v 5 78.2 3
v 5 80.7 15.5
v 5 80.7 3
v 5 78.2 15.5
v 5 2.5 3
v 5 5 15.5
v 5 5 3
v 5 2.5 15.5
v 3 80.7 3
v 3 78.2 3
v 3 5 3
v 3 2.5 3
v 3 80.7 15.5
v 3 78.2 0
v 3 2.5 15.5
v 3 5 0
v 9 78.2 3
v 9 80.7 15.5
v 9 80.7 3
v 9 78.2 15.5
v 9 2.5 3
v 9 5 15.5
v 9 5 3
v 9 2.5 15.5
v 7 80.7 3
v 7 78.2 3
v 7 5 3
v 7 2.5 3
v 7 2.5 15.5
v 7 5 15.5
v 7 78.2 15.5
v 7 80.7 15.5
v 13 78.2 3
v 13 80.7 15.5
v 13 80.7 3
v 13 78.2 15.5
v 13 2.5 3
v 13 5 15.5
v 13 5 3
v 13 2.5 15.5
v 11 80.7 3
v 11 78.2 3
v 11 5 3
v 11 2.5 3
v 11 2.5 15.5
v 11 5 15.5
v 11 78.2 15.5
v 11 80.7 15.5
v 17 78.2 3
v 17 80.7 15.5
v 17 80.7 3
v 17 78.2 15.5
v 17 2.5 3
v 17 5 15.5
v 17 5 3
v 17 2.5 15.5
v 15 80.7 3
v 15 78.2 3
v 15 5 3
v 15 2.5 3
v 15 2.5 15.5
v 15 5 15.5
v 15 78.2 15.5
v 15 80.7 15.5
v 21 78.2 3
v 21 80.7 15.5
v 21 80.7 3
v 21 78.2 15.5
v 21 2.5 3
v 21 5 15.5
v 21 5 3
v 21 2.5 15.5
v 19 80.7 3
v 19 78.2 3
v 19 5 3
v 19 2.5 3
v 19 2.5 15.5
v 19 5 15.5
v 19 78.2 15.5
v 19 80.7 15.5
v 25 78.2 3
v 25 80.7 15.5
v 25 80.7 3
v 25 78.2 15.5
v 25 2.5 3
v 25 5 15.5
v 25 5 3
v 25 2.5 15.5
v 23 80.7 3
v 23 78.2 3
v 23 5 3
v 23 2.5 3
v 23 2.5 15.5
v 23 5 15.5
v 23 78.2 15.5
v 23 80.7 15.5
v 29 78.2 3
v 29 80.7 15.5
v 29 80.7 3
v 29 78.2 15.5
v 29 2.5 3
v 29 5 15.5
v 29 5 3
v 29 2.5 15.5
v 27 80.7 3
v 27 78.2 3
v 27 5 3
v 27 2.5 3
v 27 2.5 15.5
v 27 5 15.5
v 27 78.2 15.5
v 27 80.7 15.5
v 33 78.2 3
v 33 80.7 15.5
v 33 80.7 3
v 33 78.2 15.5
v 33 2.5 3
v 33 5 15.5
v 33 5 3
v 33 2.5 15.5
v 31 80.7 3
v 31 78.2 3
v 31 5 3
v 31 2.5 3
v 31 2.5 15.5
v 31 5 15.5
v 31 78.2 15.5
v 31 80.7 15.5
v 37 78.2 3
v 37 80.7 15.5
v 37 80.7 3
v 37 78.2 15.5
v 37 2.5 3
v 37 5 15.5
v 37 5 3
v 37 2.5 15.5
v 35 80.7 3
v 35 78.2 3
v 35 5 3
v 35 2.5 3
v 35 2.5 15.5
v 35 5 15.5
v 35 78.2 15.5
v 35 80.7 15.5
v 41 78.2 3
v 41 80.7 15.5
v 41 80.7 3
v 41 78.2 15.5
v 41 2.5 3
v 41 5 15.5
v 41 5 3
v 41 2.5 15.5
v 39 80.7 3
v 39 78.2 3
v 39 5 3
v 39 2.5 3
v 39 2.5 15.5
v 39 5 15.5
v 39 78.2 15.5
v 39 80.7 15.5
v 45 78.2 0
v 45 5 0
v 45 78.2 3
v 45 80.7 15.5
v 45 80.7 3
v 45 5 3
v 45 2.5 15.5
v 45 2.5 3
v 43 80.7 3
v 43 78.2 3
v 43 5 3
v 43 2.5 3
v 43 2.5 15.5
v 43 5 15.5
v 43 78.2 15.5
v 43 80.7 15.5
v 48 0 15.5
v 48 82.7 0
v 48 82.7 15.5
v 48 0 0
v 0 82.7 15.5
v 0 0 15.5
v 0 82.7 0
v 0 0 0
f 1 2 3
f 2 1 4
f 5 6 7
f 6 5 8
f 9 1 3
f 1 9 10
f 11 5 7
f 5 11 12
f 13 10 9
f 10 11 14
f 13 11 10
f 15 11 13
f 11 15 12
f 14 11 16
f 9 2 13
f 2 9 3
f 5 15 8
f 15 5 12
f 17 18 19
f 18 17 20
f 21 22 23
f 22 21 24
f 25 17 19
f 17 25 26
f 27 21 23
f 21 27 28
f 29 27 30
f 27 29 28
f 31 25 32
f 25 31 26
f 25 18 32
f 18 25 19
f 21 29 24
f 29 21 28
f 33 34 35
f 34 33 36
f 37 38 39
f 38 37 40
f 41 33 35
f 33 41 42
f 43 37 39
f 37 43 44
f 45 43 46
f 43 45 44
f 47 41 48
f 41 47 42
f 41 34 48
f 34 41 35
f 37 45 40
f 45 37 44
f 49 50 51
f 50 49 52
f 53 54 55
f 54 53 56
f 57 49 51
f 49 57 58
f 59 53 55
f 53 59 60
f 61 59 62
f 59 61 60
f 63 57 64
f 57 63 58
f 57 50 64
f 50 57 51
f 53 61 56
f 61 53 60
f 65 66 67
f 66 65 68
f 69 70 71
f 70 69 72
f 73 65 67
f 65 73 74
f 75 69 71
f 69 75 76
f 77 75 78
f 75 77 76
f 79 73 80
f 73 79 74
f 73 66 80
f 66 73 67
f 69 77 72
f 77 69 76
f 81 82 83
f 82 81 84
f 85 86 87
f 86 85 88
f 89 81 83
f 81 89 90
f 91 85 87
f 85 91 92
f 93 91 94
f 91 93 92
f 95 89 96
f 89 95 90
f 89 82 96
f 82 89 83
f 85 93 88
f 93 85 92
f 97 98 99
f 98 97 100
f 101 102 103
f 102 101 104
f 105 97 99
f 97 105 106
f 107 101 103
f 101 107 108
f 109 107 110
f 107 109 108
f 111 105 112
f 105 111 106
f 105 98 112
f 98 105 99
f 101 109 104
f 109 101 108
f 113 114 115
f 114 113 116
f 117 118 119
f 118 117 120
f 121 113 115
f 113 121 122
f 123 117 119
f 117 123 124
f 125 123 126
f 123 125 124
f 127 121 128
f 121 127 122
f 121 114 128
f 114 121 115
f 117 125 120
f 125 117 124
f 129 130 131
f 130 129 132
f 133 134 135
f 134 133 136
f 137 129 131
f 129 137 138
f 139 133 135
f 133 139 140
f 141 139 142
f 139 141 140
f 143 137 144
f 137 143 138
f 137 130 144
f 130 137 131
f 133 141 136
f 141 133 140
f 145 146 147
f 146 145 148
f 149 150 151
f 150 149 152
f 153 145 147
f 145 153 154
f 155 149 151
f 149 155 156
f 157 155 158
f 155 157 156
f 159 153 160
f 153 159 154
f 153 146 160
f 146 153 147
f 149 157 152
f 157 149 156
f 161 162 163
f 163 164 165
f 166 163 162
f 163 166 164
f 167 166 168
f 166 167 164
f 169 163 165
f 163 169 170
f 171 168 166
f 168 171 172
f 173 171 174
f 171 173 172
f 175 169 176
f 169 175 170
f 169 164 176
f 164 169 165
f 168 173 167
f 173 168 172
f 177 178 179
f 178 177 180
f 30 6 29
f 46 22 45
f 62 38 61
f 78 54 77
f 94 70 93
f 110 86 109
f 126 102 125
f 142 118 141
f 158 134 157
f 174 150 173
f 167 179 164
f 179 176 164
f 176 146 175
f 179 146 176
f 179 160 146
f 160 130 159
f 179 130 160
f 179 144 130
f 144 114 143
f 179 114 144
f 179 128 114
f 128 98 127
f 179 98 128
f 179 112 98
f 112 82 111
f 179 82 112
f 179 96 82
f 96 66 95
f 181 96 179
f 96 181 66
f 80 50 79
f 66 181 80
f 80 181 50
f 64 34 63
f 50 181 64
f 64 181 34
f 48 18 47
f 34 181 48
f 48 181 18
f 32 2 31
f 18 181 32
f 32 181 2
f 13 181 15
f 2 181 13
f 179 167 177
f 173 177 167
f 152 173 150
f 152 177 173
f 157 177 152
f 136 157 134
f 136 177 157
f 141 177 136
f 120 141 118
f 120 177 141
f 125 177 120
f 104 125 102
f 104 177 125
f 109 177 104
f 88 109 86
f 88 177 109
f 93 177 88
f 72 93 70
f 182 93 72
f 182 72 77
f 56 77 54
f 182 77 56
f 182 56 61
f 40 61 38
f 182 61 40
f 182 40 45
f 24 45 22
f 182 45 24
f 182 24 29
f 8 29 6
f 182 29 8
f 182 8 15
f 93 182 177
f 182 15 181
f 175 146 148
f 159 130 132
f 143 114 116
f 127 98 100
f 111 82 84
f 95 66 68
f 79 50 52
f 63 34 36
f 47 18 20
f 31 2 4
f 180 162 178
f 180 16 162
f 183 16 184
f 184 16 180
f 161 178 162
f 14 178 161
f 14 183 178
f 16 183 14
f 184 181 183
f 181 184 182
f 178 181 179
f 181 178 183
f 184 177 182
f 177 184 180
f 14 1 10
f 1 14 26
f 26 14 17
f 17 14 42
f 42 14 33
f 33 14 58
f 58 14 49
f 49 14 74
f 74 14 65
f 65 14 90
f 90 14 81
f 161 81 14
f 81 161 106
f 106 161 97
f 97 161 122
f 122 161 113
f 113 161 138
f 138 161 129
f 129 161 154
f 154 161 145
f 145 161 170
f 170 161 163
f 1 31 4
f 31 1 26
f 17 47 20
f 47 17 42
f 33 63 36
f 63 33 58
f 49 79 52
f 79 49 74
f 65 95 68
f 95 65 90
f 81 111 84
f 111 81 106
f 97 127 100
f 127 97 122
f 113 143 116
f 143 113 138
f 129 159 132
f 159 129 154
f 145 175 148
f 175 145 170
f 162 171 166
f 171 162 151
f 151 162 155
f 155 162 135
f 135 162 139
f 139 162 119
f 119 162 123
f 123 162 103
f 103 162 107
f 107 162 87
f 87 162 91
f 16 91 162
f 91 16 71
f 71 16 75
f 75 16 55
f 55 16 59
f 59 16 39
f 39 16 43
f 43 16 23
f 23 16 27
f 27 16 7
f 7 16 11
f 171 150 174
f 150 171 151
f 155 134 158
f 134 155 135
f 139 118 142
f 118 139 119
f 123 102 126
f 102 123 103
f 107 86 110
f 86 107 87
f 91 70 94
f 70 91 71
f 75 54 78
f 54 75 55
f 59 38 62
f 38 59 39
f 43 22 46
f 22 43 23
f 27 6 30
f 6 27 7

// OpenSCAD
// Yantra4D Parametric Microscope Slide Holder
// Wrapper for vendor/slide-holder/slide_holder.scad
// Original design: Lucas Wilder — Michigan Technological University — EE 4777

// --- Parameters (overridden by platform) ---
slides = 10;        // Number of slide slots
thickness = 1;      // Slide thickness (mm)
length = 76.2;      // Slide length (mm)
width = 25;         // Slide width (mm)
fn = 0;             // Quality ($fn) — 0 = auto
render_mode = 0;    // 0 = holder

$fn = fn > 0 ? fn : 32;

// --- Derived dimensions (match vendor logic) ---
slot_spacing = 4;
slot_tolerance = 1;
body_width = slot_spacing * slides + 8;
body_depth = length + 6.5;
body_height = (width / 2) + 3;
wall_inset = 3;
floor_inset = 3;

// --- Modules ---
module slide_holder() {
    difference() {
        // Main body
        cube(size = [body_width, body_depth, body_height], center = false);

        // Slide slots with tolerance
        for (i = [0 : 1 : slides]) {
            translate([wall_inset + (slot_spacing * i), 2.5, floor_inset])
                cube(size = [thickness + slot_tolerance, length + 2, width], center = false);
        }

        // Center cutout for easy slide access
        translate([wall_inset, 5, -1])
            cube(size = [slot_spacing * slides + 2, length - 3, width + 4], center = false);
    }
}

// --- Render mode dispatch ---
if (render_mode == 0) {
    slide_holder();
}
